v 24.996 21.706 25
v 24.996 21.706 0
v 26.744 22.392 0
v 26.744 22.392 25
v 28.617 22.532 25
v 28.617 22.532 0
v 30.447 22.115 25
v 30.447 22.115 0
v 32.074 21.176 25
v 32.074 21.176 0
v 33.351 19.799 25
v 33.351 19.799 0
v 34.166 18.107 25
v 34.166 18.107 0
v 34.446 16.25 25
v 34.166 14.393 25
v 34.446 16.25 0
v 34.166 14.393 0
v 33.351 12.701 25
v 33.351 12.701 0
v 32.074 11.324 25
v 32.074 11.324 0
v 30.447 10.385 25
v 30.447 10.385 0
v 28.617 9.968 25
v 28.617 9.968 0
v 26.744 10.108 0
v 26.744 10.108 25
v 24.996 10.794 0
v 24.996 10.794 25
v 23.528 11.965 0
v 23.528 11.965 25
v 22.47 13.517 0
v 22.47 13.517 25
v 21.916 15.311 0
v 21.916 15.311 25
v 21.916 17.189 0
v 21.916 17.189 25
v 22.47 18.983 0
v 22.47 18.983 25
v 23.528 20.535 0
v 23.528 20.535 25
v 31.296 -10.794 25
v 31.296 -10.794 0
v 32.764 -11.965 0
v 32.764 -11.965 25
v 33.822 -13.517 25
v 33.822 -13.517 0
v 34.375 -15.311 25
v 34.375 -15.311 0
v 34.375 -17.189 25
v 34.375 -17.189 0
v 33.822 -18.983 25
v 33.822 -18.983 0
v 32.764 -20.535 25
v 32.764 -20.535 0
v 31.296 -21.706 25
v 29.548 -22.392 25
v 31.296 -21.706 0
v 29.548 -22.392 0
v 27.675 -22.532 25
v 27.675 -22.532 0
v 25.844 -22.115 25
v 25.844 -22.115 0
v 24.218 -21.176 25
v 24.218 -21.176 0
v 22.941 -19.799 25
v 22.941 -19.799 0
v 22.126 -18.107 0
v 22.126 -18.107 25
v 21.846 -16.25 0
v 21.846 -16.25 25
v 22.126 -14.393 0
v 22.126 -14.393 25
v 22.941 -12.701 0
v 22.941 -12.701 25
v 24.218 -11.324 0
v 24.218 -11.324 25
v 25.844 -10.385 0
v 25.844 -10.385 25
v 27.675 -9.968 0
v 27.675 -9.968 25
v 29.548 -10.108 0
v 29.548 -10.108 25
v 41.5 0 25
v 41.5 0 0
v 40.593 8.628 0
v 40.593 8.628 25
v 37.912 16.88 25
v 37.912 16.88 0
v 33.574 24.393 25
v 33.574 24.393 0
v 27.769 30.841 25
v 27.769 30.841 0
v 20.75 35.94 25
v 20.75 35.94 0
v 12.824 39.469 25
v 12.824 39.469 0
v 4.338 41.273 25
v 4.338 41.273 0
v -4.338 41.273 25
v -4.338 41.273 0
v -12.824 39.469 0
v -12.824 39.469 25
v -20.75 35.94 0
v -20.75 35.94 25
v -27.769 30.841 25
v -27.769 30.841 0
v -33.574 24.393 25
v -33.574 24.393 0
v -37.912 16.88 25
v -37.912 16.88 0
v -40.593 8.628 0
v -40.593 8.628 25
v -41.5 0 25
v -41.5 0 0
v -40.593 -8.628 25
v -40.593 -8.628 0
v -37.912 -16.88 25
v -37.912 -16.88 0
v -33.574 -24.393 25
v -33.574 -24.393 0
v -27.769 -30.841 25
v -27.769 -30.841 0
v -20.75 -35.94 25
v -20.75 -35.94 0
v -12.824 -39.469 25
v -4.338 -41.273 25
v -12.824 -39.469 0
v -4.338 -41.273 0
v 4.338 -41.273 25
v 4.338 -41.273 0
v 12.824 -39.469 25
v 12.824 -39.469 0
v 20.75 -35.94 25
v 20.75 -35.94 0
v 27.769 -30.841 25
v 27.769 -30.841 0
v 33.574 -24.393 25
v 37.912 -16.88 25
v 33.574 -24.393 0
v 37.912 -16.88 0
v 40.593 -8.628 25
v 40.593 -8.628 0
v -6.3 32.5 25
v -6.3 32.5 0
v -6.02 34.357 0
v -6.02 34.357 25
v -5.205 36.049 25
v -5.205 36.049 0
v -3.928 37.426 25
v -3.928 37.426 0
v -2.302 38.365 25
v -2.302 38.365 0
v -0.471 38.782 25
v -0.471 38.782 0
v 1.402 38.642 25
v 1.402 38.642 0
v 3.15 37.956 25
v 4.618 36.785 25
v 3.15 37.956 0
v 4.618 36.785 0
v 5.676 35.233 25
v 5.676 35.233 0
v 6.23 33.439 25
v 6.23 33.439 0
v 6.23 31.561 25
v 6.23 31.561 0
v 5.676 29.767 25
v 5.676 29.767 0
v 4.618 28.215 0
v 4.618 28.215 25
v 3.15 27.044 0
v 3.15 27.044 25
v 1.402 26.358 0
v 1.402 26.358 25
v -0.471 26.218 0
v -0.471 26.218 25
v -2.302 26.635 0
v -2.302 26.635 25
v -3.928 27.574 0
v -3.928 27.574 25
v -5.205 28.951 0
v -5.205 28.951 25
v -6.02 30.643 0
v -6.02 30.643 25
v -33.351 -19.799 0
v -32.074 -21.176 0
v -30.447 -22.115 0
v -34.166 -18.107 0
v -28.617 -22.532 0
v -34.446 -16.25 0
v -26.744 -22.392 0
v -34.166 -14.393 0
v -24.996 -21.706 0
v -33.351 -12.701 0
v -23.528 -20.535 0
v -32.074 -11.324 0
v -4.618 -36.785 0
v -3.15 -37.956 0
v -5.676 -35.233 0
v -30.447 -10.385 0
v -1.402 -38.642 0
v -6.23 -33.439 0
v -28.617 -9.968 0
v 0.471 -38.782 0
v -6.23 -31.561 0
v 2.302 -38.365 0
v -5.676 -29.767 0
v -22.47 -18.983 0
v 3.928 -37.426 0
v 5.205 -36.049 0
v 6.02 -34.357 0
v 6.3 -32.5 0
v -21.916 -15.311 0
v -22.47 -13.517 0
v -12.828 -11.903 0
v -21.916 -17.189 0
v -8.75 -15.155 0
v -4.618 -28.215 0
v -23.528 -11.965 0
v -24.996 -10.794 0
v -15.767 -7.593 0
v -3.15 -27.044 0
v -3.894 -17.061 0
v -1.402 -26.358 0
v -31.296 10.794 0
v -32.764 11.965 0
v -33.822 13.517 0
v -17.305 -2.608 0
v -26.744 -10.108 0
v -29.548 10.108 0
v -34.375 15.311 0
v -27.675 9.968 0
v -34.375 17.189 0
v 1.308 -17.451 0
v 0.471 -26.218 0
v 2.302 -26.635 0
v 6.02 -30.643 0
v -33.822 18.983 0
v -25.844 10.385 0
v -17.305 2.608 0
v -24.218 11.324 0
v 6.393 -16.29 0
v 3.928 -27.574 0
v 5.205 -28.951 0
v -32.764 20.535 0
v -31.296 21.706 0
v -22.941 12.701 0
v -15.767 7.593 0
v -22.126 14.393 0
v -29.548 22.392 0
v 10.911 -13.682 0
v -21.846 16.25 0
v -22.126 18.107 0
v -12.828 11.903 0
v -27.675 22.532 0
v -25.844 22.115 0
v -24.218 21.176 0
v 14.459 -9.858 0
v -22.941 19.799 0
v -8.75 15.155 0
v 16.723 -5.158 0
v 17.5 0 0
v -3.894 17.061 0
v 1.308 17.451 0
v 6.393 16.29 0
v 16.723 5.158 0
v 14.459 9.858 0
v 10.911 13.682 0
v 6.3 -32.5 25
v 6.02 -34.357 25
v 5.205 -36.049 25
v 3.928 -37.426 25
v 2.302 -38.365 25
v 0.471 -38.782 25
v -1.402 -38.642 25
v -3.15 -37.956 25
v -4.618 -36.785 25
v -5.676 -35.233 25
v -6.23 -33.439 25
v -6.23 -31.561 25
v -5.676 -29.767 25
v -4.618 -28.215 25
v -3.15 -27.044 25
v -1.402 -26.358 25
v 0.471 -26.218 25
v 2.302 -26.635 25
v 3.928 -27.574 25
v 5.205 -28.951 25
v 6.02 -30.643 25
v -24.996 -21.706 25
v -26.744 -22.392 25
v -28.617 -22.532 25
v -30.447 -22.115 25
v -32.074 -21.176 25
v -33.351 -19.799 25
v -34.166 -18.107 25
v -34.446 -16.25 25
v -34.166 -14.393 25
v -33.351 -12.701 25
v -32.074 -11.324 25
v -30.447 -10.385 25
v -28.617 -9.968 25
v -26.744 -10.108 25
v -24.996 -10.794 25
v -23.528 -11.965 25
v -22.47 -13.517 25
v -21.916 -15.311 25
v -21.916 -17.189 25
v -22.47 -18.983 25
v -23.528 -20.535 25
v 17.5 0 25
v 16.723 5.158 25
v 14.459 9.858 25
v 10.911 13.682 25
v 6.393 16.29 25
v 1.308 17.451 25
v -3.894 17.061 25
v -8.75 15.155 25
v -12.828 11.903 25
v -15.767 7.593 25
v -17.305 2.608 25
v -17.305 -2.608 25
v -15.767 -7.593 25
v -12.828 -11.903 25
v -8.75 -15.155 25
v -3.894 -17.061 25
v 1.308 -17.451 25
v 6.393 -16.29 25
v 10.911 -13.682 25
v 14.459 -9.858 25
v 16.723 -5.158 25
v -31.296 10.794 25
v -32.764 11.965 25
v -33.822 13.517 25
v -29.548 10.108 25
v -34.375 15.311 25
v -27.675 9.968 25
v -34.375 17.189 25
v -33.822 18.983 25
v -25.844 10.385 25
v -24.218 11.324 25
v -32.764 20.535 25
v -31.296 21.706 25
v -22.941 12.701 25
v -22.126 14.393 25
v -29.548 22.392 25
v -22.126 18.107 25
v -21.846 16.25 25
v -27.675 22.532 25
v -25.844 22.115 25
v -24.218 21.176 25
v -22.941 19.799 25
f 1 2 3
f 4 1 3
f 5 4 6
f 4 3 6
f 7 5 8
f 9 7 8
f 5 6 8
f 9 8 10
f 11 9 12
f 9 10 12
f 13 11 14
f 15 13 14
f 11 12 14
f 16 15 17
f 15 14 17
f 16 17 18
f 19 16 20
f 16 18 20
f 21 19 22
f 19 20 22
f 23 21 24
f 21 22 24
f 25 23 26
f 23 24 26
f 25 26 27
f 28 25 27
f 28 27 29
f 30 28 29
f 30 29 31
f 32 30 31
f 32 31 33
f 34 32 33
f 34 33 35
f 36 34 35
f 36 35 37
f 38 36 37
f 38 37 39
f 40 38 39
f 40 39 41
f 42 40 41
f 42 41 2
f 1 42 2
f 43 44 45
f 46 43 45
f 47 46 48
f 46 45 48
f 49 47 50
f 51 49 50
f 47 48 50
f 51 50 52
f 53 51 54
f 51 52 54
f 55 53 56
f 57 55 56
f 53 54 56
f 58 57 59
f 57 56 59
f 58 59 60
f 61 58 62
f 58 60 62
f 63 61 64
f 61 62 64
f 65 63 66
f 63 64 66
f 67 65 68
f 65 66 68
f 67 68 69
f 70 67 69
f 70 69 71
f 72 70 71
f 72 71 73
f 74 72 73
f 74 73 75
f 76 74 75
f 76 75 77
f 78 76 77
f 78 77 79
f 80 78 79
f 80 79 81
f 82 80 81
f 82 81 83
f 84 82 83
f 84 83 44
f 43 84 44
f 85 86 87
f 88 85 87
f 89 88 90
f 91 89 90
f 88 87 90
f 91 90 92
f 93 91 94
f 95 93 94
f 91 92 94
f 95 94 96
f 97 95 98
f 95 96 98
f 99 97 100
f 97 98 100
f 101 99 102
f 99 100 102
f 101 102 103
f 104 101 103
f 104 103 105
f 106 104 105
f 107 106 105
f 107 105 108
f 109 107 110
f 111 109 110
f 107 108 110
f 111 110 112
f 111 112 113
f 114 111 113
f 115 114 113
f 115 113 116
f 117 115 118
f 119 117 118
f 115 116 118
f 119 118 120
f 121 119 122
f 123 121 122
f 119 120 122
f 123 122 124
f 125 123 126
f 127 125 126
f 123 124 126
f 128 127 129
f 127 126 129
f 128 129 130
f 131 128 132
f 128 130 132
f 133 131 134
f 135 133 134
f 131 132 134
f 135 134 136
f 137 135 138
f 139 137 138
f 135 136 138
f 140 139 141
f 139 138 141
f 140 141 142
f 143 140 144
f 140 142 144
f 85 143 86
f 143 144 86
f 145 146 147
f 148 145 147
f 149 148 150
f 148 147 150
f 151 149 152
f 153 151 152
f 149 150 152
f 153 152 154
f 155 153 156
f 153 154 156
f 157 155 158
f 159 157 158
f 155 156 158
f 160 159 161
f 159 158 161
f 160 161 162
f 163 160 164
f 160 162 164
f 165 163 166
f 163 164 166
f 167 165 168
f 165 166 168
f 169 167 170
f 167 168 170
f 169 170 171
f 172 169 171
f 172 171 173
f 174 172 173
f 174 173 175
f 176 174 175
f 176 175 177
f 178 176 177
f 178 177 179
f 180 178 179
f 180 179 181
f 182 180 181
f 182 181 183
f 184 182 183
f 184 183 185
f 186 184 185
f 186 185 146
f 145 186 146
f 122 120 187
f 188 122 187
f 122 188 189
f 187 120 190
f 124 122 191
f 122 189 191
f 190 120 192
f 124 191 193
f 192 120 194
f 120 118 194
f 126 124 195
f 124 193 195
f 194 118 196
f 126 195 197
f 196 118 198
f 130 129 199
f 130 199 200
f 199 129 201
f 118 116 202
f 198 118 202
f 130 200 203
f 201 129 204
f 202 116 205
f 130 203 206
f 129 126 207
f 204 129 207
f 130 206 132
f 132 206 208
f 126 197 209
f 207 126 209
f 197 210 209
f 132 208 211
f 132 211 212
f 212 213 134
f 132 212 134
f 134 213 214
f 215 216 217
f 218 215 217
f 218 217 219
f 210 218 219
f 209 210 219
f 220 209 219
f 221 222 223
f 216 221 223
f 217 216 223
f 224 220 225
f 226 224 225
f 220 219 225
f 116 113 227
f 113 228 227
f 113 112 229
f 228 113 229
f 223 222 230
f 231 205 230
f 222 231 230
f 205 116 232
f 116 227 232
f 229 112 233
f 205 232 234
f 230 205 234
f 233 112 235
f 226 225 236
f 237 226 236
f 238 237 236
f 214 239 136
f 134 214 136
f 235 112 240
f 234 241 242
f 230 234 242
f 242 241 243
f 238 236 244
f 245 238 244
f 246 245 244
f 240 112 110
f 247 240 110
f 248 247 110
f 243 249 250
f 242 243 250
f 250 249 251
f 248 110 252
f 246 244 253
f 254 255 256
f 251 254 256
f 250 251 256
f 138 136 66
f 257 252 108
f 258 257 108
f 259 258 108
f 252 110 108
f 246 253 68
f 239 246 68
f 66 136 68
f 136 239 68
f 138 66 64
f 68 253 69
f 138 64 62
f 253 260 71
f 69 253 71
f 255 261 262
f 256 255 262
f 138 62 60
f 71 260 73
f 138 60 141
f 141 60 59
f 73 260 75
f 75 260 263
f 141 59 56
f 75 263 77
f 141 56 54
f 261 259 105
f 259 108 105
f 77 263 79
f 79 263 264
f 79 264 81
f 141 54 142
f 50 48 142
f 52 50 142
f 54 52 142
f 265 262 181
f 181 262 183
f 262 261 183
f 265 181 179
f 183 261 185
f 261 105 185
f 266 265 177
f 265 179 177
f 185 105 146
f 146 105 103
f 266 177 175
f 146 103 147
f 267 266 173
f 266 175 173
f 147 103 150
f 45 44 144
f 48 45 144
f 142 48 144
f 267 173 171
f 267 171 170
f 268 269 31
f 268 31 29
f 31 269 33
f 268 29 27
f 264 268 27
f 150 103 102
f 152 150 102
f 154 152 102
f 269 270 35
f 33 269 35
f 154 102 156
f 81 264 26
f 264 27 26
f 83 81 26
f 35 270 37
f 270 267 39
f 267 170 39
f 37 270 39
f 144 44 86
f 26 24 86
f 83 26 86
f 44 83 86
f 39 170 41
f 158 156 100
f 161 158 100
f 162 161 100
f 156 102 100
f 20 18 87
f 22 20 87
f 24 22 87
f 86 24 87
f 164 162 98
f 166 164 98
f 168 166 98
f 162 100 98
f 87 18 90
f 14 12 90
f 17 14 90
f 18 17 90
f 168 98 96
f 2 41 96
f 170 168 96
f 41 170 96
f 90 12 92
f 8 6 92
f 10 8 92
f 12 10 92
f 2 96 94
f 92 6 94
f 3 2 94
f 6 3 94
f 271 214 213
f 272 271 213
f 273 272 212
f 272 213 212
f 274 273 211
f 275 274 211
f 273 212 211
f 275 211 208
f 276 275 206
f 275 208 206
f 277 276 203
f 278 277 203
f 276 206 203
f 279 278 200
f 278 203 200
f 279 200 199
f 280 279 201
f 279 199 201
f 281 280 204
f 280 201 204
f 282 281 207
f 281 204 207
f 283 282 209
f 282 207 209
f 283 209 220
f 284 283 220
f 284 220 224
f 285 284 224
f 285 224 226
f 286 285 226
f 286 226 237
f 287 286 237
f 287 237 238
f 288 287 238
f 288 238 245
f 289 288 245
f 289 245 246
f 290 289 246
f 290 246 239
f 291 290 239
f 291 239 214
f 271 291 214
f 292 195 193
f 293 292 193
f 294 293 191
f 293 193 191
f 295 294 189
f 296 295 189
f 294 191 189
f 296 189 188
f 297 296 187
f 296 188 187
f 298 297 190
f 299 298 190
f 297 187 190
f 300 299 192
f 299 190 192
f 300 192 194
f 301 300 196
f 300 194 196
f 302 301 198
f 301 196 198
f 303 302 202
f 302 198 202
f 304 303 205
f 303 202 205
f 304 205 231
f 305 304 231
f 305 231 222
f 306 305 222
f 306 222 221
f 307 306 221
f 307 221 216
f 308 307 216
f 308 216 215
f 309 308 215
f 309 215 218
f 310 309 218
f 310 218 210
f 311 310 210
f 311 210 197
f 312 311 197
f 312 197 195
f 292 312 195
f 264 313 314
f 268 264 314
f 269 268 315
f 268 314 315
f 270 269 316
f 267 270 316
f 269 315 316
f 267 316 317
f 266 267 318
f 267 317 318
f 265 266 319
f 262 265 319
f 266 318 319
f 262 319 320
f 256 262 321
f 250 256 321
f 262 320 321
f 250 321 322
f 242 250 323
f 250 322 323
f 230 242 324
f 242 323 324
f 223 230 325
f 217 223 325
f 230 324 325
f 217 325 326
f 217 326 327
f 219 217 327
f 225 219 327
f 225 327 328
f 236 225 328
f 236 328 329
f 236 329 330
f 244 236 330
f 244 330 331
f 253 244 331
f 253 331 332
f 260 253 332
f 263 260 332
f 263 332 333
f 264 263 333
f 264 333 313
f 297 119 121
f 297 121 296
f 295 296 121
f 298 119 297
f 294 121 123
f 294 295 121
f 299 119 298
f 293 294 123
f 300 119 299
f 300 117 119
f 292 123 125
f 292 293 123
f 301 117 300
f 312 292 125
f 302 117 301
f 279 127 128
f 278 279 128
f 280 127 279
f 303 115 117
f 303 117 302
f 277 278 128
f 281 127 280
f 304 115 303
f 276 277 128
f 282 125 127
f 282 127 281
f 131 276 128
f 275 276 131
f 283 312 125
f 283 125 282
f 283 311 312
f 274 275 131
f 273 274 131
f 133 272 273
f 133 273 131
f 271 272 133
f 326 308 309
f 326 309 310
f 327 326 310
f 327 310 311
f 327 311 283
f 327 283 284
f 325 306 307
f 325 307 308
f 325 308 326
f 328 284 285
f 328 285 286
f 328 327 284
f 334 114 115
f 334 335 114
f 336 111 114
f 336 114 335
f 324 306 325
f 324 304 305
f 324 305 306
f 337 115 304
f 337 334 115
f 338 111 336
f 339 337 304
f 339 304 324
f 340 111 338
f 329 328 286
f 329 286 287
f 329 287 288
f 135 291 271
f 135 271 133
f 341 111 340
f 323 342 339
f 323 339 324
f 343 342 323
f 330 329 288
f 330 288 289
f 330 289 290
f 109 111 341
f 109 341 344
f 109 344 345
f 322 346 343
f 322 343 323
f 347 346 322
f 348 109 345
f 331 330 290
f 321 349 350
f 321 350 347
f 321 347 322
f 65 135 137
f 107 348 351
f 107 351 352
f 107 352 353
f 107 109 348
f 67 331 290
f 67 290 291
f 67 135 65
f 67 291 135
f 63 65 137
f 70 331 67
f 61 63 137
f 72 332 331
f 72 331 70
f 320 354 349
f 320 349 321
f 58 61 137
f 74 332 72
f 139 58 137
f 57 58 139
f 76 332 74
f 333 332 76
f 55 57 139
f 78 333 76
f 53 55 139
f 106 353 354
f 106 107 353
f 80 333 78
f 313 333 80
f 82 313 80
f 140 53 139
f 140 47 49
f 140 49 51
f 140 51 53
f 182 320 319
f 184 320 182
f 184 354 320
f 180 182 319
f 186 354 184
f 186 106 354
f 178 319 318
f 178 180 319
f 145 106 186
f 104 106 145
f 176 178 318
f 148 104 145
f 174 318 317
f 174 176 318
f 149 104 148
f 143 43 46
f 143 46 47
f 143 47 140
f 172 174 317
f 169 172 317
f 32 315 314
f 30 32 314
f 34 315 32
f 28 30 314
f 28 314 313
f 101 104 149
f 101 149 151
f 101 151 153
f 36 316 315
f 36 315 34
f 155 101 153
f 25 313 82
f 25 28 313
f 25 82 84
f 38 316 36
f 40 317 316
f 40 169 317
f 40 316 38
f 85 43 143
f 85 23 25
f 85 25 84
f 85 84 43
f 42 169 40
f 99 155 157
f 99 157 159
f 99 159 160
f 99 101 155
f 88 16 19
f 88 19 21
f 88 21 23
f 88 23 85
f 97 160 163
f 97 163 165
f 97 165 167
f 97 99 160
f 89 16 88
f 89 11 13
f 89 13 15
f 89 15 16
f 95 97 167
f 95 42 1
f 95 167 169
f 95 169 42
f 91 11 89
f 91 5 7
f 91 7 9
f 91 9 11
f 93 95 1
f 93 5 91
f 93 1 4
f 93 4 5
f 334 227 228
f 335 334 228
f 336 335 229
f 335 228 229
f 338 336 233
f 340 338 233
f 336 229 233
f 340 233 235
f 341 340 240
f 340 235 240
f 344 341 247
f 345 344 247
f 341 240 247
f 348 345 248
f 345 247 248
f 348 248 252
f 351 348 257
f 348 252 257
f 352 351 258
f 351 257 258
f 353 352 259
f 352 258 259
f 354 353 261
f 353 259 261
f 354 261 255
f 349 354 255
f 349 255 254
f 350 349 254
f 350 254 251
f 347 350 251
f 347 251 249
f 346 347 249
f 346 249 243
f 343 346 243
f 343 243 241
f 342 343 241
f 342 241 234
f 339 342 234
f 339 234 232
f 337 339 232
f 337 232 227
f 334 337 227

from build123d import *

# Parameters (mm, degrees)
F0_R            = 41.5
F1_DEPTH        = 25
F3_D            = 12.6
F3_COPIES_COUNT = 6
F4_R            = 17.5
F5_DEPTH        = 25.001


# Not quite as in the source:
# - a pattern or mirror of a feature is missing from the dataset's text; its kind, count and spacing are read off the source's solid


with BuildPart() as f1:
    # F0 (on Top) → F1 (new body)
    with BuildSketch(Plane.XY):
        Circle(F0_R)
    extrude(amount=F1_DEPTH)

    # F3 (through all)
    with Locations(Plane.XY.offset(25)):
        with Locations((0, 32.5)):
            f3 = Hole(F3_D / 2)

    # F3_copies: F3 ×6 about axis
    f3_copies_axis = Axis((0, 0, 0), (0, 0, 1))
    for i in range(1, F3_COPIES_COUNT):
        add(f3.rotate(f3_copies_axis, i * 360 / F3_COPIES_COUNT), mode=Mode.SUBTRACT)

    # F4 (on face) → F5 (cut, through all)
    with BuildSketch(Plane.XY.offset(25)):
        Circle(F4_R)
    extrude(amount=-F5_DEPTH, mode=Mode.SUBTRACT)


solid = f1.part
